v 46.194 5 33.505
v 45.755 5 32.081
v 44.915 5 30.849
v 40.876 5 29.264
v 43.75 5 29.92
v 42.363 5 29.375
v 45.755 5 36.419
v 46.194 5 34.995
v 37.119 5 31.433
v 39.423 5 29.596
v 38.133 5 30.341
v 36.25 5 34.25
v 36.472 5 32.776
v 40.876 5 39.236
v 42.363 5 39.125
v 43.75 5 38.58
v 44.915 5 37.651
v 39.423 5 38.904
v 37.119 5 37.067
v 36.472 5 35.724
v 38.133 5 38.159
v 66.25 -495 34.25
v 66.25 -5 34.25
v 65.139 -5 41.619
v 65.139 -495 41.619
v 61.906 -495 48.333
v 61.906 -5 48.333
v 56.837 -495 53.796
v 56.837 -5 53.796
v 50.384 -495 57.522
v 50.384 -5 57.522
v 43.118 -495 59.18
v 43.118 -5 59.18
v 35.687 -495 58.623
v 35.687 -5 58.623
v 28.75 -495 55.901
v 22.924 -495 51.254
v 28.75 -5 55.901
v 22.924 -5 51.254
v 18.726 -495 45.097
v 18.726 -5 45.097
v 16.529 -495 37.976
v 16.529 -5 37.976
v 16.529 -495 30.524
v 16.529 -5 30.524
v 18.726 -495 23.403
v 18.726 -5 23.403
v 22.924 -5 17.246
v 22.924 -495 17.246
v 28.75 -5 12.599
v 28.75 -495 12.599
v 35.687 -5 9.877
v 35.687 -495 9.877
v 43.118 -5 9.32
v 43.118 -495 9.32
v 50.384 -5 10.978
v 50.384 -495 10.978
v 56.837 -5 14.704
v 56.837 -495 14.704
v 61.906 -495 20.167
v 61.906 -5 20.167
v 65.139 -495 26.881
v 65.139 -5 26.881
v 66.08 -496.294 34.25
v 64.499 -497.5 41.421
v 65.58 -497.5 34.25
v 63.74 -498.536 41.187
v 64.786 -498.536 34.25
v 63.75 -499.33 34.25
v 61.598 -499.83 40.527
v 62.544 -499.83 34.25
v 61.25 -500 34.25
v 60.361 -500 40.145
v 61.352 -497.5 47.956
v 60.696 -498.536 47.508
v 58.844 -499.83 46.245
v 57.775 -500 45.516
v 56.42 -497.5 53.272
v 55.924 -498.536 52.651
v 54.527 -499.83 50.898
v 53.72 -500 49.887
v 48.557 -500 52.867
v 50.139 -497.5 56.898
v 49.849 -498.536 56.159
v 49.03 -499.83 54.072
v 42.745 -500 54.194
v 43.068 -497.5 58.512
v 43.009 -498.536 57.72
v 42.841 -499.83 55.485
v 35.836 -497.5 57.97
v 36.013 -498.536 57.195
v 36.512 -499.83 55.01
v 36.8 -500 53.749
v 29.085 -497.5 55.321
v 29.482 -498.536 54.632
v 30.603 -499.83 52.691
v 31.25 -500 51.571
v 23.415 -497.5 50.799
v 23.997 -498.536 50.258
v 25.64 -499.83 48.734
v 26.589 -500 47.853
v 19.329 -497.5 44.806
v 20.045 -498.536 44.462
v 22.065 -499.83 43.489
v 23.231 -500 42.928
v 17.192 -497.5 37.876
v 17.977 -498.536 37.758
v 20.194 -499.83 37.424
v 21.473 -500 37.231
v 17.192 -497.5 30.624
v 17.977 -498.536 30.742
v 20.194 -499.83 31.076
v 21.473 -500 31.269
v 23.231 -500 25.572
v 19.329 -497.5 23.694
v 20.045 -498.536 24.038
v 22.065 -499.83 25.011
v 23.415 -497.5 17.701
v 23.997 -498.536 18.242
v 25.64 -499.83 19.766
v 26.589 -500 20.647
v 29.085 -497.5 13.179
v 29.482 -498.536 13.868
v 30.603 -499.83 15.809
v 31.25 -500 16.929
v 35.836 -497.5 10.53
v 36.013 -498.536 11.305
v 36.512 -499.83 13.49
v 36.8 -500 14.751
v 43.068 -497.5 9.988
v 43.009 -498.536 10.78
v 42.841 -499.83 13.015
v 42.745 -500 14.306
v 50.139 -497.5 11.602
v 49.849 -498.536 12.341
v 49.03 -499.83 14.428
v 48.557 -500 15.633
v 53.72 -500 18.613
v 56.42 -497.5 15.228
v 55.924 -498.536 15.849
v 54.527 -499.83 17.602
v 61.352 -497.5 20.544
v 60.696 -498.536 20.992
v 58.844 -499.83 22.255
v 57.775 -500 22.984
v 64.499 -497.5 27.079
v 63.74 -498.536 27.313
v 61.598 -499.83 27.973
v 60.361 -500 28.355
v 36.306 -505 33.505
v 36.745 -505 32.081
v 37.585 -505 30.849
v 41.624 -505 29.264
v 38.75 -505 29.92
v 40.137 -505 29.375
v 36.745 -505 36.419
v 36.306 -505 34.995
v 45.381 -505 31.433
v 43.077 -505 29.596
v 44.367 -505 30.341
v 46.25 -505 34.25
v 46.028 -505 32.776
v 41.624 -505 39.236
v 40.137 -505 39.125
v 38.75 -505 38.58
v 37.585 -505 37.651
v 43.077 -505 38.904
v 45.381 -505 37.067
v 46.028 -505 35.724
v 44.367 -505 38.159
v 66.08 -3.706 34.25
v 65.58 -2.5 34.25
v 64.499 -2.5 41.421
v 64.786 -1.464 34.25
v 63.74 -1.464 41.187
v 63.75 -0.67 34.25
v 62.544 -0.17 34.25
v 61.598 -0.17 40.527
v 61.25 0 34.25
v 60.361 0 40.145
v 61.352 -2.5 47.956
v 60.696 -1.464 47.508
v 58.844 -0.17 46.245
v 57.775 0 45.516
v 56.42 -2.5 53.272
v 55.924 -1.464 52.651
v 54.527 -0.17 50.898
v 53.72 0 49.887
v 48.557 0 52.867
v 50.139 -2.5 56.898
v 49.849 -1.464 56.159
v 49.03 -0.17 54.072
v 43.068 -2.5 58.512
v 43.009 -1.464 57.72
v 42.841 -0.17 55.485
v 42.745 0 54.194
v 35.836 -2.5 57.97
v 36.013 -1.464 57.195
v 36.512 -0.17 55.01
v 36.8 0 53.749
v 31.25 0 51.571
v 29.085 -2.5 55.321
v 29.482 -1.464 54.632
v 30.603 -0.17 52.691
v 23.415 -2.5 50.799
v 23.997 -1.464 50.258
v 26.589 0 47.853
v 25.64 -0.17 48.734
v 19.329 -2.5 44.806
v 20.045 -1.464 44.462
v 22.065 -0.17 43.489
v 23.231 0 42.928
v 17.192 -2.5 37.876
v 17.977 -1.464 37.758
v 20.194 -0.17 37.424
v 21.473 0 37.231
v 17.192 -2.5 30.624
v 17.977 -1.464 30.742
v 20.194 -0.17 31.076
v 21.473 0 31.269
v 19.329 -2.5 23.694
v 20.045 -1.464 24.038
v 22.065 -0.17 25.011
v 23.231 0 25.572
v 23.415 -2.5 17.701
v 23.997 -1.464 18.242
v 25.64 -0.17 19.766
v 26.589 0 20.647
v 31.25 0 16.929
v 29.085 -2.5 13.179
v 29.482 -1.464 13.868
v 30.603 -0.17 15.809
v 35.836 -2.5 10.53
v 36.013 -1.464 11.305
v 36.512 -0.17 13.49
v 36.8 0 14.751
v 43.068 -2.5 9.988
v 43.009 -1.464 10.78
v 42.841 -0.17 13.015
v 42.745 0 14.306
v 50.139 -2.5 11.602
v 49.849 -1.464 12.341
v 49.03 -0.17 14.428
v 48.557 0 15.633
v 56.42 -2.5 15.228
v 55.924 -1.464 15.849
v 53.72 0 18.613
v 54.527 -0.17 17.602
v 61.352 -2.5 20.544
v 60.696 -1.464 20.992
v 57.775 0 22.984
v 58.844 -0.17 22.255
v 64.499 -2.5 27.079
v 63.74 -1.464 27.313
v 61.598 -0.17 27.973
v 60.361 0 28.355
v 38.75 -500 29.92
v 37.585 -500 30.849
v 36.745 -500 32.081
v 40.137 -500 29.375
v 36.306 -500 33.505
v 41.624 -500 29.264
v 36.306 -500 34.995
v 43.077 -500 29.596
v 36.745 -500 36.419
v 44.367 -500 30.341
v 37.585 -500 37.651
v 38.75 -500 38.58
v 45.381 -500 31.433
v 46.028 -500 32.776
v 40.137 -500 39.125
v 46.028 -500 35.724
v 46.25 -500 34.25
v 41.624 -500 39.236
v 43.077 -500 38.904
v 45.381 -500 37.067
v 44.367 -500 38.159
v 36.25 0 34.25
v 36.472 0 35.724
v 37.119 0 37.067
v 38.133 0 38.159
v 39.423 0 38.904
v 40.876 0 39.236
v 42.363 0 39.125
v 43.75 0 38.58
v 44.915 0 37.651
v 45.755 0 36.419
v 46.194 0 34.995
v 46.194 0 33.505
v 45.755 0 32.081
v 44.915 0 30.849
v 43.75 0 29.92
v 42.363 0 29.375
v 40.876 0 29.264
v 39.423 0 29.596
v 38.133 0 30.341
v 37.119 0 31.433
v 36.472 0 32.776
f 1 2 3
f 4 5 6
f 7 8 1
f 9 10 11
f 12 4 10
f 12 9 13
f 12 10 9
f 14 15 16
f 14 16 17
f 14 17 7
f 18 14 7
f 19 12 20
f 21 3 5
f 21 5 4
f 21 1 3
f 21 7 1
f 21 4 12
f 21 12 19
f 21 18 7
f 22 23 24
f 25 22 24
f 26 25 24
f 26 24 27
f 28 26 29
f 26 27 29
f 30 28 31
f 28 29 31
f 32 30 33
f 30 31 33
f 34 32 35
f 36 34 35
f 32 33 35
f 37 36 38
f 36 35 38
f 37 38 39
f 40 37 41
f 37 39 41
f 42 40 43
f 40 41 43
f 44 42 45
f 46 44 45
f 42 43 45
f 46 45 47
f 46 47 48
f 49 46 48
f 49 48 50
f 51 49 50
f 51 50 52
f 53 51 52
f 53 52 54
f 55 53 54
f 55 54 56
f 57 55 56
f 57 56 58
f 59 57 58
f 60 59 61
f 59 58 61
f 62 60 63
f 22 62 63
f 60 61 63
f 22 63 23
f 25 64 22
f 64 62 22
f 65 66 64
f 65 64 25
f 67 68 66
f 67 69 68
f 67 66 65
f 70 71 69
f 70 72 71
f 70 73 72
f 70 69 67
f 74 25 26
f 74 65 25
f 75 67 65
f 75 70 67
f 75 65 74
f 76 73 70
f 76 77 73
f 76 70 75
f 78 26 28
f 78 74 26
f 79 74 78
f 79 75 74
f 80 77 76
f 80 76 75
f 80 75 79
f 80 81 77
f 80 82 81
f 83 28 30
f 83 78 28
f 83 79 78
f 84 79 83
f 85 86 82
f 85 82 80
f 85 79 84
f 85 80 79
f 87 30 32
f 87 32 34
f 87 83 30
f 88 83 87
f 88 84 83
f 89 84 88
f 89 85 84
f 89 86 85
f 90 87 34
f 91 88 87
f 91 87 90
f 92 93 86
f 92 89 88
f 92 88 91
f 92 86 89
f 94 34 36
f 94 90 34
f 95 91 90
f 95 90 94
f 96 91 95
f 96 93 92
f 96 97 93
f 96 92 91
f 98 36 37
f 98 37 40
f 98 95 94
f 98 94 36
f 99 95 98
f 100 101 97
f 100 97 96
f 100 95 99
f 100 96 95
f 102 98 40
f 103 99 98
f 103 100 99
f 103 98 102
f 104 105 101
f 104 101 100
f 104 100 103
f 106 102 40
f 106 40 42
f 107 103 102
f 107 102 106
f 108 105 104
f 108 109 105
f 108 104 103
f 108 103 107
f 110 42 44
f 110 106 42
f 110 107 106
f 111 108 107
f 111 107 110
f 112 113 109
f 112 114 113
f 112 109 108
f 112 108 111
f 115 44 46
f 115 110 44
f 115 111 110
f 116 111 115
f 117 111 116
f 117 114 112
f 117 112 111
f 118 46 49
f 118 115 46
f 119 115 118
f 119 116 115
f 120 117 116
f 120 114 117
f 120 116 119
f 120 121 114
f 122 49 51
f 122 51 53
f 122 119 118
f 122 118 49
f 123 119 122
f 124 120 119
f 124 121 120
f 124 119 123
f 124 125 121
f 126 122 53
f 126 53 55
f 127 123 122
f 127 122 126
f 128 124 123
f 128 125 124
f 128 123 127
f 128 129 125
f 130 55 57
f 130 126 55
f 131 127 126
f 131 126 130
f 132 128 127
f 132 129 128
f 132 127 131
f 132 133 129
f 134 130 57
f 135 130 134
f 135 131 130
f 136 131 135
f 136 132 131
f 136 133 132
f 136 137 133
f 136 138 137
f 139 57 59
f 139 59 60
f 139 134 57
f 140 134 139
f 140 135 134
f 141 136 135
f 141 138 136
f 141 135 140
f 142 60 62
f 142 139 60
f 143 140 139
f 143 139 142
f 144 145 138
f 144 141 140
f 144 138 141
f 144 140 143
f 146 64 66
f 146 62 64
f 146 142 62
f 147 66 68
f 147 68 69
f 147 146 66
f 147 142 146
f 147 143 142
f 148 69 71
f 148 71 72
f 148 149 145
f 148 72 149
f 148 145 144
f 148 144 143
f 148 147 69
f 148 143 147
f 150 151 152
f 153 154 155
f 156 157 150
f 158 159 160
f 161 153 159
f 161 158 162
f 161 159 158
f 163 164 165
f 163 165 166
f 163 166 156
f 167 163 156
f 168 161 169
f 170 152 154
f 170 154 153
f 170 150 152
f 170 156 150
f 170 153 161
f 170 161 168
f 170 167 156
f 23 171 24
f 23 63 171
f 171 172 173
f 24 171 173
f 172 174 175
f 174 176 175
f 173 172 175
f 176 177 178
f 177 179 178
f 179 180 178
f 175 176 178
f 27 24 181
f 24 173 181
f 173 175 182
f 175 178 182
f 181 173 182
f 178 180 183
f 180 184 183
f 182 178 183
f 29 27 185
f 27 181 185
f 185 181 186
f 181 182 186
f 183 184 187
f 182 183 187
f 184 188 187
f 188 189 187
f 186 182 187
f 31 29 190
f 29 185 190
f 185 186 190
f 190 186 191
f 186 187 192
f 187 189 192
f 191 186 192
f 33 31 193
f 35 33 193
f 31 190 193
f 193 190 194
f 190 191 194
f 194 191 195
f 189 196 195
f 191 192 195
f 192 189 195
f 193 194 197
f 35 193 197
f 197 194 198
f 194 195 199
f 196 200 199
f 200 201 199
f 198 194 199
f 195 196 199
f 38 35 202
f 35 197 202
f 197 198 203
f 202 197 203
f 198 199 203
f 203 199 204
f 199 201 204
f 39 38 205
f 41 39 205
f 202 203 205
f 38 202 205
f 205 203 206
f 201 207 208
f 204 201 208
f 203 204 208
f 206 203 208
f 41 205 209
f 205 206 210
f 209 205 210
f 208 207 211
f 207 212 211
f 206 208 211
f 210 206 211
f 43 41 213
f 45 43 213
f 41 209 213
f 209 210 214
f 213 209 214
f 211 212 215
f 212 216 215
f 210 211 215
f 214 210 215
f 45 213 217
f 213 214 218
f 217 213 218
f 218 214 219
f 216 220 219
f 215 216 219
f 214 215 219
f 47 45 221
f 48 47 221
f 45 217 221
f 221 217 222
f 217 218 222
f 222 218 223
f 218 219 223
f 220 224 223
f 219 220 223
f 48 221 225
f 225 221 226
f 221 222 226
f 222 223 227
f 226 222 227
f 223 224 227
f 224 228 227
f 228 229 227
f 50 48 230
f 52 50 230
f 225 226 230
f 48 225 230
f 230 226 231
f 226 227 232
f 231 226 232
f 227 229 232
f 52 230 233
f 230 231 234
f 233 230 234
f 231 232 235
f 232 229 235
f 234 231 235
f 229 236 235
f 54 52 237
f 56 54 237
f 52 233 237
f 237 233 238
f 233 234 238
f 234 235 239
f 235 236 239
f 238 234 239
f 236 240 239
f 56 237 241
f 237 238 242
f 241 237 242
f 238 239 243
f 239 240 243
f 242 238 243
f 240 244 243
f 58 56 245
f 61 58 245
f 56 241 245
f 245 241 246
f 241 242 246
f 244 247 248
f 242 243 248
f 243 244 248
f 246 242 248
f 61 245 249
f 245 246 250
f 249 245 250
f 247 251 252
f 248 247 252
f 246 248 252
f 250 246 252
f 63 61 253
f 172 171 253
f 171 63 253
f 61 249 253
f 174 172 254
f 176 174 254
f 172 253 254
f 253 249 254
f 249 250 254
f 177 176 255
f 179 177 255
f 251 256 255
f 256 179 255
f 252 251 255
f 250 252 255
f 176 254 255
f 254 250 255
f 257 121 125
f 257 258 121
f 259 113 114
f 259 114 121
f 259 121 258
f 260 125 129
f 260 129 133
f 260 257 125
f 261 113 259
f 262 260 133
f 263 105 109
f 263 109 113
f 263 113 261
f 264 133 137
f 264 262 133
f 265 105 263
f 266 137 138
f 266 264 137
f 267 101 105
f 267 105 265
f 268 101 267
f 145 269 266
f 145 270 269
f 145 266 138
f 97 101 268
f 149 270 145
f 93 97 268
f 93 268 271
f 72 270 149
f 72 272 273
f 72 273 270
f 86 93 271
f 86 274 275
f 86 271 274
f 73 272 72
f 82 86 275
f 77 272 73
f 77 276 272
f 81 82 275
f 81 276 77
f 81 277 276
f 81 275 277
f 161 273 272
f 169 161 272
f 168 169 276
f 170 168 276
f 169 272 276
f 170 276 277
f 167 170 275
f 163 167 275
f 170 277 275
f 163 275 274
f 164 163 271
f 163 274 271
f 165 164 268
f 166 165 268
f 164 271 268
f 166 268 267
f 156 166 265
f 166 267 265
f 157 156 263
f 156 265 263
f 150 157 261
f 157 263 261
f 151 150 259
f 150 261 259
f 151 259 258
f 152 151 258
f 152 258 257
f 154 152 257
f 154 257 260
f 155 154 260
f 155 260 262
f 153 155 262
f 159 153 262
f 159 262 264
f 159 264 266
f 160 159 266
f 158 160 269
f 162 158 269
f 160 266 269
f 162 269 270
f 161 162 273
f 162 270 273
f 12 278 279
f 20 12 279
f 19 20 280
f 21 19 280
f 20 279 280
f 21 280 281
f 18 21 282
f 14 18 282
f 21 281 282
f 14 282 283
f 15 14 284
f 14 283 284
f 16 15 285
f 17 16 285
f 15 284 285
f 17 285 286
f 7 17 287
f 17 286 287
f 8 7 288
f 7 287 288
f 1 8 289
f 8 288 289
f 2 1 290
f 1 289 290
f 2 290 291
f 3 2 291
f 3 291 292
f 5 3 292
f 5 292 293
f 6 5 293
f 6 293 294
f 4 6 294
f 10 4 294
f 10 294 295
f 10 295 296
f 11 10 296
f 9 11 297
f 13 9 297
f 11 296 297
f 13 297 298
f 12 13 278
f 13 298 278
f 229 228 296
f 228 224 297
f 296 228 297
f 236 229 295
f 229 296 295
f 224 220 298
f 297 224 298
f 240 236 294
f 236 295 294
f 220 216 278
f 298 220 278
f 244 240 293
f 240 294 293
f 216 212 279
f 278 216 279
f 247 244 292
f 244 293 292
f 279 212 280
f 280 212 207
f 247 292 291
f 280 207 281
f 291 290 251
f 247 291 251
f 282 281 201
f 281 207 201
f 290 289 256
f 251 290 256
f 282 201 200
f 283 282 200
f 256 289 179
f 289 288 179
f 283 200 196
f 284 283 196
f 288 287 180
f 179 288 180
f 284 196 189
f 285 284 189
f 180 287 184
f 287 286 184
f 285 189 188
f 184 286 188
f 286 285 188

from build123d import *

# Parameters (mm, degrees)
F0_R     = 25
F1_DEPTH = 500
F2_R     = 5
F3_DEPTH = 5
F4_R     = 5
F5_DEPTH = 5
F6_R     = 5
F7_R     = 5


with BuildPart() as f1:
    # F0 (on Front) → F1 (new body)
    with BuildSketch(Plane.XZ):
        with Locations((41.250005, 34.250002)):
            Circle(F0_R)
    extrude(amount=F1_DEPTH)

    # F2 (on face) → F3 (join)
    with BuildSketch(Plane(origin=(0, 0, 0), x_dir=(-1, 0, 0), z_dir=(0, 1, 0))):
        with Locations((-41.250005, 34.250002)):
            Circle(F2_R)
    extrude(amount=F3_DEPTH)

    # F4 (on face) → F5 (join)
    with BuildSketch(Plane.XZ.offset(500)):
        with Locations((41.250005, 34.250002)):
            Circle(F4_R)
    extrude(amount=F5_DEPTH)

    # F6
    f6_edges = [f1.edges().sort_by_distance(p)[0] for p in [
        (16.250005, 0, 34.250002),
    ]]
    fillet(f6_edges, radius=F6_R)

    # F7
    f7_edges = [f1.edges().sort_by_distance(p)[0] for p in [
        (16.250005, -500, 34.250002),
    ]]
    fillet(f7_edges, radius=F7_R)


solid = f1.part
